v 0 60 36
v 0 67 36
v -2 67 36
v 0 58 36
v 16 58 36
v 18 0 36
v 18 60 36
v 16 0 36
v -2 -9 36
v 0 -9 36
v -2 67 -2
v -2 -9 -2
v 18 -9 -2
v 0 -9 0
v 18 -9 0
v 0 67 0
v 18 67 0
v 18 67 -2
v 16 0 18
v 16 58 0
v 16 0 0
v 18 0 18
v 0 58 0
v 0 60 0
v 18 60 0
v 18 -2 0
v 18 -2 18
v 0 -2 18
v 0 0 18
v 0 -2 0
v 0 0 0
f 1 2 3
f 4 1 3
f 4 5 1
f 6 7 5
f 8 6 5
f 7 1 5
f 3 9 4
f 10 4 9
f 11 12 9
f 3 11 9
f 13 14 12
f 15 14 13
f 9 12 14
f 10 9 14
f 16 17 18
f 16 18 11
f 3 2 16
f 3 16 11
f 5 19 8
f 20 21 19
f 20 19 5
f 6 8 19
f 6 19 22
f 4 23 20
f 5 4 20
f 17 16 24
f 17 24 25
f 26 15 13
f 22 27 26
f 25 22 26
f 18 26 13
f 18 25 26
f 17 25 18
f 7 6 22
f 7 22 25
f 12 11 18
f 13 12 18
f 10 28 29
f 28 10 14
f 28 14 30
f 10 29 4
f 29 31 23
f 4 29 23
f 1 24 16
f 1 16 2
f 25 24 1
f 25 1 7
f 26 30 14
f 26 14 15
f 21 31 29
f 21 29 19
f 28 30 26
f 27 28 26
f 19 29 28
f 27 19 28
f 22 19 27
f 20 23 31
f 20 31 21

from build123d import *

# Parameters (mm, degrees)
F0_W     = 20
F0_H     = 7
F0_H_2   = 62
F0_W_2   = 16
F0_H_3   = 58
F1_DEPTH = 2
F2_DEPTH = 36
F3_W     = 2
F3_H     = 36
F4_DEPTH = 7
F5_W     = 2
F5_H     = 36
F6_DEPTH = 7
F7_W     = 18
F7_H     = 2
F8_DEPTH = 18


with BuildPart() as f1:
    # F0 (on Top) → F1 (new body)
    with BuildSketch(Plane.XY):
        with Locations((8, 63.5)):
            Rectangle(F0_W, F0_H)
        with Locations((8, 29)):
            Rectangle(F0_W, F0_H_2)
        with Locations((8, 29)):
            Rectangle(F0_W_2, F0_H_3, mode=Mode.SUBTRACT)
        with Locations((8, 29)):
            Rectangle(F0_W_2, F0_H_3)
        with Locations((8, -5.5)):
            Rectangle(F0_W, F0_H)
    extrude(amount=-F1_DEPTH)

    # F0 (on Top) → F2 (join)
    with BuildSketch(Plane.XY):
        with Locations((8, 29)):
            Rectangle(F0_W, F0_H_2)
        with Locations((8, 29)):
            Rectangle(F0_W_2, F0_H_3, mode=Mode.SUBTRACT)
    extrude(amount=F2_DEPTH)

    # F3 (on face) → F4 (join)
    with BuildSketch(Plane.XZ.offset(2)):
        with Locations((-1, 18)):
            Rectangle(F3_W, F3_H)
    extrude(amount=F4_DEPTH)

    # F5 (on face) → F6 (join)
    with BuildSketch(Plane(origin=(0, 60, 0), x_dir=(-1, 0, 0), z_dir=(0, 1, 0))):
        with Locations((1, 18)):
            Rectangle(F5_W, F5_H)
    extrude(amount=F6_DEPTH)

    # F7 (on face) → F8 (cut)
    with BuildSketch(Plane.XY.offset(36)):
        with Locations((9, -1)):
            Rectangle(F7_W, F7_H)
    extrude(amount=-F8_DEPTH, mode=Mode.SUBTRACT)


solid = f1.part
